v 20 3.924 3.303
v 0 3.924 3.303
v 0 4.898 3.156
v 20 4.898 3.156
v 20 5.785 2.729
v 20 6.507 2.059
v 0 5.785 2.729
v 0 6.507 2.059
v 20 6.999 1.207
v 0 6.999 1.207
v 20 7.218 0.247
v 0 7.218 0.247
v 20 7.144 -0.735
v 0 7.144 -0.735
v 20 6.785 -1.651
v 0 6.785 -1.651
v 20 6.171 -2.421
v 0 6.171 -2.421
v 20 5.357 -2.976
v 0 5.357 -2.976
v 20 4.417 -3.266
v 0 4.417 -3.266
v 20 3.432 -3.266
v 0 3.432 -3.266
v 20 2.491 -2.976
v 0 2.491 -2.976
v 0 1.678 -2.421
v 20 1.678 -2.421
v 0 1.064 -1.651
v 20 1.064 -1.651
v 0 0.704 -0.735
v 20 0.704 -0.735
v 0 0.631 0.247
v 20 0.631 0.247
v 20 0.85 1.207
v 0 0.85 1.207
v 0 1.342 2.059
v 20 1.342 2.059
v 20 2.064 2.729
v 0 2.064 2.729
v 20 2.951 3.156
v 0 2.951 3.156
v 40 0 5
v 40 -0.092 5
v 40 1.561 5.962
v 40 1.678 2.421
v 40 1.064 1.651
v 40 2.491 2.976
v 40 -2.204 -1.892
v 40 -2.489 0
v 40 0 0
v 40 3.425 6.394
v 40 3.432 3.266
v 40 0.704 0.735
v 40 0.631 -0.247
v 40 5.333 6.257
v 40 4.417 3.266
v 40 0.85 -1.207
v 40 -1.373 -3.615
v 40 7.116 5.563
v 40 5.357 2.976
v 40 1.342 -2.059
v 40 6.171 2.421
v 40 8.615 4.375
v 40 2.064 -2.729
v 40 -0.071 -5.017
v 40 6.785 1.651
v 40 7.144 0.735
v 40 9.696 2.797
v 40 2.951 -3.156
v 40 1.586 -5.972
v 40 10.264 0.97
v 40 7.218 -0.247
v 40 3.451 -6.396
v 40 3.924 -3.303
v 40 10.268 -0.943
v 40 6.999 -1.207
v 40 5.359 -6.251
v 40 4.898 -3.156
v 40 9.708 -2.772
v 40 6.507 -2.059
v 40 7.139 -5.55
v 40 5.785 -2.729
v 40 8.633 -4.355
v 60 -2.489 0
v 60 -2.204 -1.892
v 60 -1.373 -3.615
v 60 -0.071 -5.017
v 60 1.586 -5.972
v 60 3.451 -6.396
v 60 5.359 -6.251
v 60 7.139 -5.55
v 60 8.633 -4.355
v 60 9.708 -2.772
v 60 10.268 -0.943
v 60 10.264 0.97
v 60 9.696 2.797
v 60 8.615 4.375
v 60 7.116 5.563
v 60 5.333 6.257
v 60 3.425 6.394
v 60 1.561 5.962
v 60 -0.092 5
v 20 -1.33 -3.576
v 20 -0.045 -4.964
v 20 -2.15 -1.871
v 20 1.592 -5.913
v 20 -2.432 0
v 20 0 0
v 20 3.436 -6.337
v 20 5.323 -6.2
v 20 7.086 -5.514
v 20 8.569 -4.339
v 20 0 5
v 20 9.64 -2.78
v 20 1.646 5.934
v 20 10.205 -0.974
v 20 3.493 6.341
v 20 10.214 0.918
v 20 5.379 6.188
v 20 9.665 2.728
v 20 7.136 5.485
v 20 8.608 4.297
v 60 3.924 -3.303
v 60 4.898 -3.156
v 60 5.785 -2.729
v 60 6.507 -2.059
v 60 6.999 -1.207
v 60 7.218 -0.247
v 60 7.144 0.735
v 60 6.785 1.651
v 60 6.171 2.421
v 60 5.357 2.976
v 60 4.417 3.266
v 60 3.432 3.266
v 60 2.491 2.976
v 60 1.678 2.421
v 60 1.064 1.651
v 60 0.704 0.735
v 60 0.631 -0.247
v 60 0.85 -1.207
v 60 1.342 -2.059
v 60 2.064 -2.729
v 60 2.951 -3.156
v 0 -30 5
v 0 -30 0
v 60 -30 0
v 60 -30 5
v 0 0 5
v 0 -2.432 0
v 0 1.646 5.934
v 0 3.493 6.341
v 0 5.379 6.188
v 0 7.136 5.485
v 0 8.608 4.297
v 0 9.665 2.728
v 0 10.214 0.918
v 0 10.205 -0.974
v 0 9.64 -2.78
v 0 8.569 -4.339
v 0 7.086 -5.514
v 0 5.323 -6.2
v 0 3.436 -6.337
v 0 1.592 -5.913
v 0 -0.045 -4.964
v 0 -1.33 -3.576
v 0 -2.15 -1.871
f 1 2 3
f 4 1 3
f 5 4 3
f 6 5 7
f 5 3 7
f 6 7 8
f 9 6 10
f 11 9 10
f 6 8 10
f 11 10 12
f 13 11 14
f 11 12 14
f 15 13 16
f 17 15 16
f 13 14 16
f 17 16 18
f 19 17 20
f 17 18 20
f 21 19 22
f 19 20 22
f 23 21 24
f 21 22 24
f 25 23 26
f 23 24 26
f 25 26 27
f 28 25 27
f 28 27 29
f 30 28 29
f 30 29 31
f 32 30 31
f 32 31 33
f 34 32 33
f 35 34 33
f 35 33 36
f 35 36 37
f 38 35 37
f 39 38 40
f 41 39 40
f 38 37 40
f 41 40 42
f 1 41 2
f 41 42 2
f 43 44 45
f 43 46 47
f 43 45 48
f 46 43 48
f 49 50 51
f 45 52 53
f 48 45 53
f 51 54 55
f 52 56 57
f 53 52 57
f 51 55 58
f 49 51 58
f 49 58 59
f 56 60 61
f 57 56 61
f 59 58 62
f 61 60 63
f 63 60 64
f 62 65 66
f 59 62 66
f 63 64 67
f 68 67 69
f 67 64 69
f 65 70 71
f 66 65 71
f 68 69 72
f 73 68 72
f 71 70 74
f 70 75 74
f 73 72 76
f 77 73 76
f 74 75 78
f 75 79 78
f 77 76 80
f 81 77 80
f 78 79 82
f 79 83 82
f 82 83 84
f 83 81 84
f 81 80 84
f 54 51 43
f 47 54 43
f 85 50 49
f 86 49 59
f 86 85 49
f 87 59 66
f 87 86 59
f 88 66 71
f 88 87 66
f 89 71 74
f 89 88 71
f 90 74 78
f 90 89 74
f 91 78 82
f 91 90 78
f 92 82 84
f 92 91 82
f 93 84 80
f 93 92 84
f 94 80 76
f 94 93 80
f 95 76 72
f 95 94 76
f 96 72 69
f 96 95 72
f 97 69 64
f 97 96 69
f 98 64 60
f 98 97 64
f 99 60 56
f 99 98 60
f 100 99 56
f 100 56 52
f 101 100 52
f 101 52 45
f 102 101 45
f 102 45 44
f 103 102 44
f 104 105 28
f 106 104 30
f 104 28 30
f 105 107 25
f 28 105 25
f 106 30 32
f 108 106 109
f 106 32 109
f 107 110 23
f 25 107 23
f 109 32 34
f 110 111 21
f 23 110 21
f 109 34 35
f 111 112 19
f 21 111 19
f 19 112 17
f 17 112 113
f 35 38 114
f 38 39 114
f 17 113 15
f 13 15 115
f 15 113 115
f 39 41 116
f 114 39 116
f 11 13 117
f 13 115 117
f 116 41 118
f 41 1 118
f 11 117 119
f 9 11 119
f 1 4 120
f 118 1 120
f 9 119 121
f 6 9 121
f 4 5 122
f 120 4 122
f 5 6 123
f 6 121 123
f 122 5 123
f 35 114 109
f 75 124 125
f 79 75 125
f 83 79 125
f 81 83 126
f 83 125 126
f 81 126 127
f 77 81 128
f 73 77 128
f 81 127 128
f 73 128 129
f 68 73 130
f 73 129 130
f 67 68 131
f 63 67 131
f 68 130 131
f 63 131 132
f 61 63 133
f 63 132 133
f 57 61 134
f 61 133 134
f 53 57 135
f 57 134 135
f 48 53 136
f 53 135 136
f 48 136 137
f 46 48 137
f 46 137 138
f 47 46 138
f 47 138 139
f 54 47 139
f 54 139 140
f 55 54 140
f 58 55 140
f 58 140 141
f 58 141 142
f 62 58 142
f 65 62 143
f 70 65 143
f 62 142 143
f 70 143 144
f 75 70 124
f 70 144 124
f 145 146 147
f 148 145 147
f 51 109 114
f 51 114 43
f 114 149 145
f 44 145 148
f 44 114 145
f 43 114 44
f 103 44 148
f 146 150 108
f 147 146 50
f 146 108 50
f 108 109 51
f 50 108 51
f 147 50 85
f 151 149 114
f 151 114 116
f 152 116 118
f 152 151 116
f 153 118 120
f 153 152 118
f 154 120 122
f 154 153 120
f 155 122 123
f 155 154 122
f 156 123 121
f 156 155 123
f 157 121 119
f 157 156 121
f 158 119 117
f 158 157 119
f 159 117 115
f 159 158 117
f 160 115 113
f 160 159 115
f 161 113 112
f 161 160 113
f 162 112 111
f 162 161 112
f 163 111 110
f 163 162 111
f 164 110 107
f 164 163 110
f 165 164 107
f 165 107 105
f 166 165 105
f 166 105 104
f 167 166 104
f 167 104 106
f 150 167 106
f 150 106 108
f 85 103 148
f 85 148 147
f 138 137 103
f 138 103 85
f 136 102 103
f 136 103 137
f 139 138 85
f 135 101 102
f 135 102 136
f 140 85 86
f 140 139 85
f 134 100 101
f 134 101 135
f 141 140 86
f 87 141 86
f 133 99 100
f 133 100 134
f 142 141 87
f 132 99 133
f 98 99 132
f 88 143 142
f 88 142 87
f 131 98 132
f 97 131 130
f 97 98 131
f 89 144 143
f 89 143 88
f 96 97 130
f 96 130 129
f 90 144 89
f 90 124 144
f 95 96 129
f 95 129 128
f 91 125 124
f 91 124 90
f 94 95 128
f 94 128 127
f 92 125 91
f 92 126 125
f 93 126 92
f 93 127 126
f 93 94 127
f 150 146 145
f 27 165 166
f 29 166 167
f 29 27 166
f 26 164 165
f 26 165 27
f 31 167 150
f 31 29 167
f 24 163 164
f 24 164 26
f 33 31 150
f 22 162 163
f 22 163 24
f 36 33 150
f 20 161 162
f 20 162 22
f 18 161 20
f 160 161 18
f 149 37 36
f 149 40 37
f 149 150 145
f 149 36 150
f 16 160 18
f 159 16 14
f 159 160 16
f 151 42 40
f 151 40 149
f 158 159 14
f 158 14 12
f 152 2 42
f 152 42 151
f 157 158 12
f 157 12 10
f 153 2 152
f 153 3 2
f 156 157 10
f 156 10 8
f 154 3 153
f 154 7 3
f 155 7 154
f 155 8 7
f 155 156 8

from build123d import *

# Parameters (mm, degrees)
SKETCH1_W           = 60
SKETCH1_H           = 30
BOSS_EXTRUDE1_DEPTH = 5
SKETCH2_R           = 6.41363938
SKETCH2_R_2         = 3.302926723
BOSS_EXTRUDE2_DEPTH = 20
SKETCH3_R           = 6.356146431
SKETCH3_R_2         = 3.302926723
BOSS_EXTRUDE3_DEPTH = 20


with BuildPart() as part:
    # Sketch1 → Boss-Extrude1 (new body)
    with BuildSketch(Plane.XY):
        with Locations((30, -15)):
            Rectangle(SKETCH1_W, SKETCH1_H)
    extrude(amount=BOSS_EXTRUDE1_DEPTH)

    # Sketch2 → Boss-Extrude2 (add)
    with BuildSketch(Plane(origin=(60, 0, 0), x_dir=(0, 0, -1), z_dir=(1, 0, 0))):
        with Locations((0, 3.924359496)):
            Circle(SKETCH2_R)
        with Locations((0, 3.924359496)):
            Circle(SKETCH2_R_2, mode=Mode.SUBTRACT)
    extrude(amount=-BOSS_EXTRUDE2_DEPTH)

    # Sketch3 → Boss-Extrude3 (add)
    with BuildSketch(Plane.ZY):
        with Locations((0, 3.924359496)):
            Circle(SKETCH3_R)
        with Locations((0, 3.924359496)):
            Circle(SKETCH3_R_2, mode=Mode.SUBTRACT)
    extrude(amount=-BOSS_EXTRUDE3_DEPTH)


solid = part.part
